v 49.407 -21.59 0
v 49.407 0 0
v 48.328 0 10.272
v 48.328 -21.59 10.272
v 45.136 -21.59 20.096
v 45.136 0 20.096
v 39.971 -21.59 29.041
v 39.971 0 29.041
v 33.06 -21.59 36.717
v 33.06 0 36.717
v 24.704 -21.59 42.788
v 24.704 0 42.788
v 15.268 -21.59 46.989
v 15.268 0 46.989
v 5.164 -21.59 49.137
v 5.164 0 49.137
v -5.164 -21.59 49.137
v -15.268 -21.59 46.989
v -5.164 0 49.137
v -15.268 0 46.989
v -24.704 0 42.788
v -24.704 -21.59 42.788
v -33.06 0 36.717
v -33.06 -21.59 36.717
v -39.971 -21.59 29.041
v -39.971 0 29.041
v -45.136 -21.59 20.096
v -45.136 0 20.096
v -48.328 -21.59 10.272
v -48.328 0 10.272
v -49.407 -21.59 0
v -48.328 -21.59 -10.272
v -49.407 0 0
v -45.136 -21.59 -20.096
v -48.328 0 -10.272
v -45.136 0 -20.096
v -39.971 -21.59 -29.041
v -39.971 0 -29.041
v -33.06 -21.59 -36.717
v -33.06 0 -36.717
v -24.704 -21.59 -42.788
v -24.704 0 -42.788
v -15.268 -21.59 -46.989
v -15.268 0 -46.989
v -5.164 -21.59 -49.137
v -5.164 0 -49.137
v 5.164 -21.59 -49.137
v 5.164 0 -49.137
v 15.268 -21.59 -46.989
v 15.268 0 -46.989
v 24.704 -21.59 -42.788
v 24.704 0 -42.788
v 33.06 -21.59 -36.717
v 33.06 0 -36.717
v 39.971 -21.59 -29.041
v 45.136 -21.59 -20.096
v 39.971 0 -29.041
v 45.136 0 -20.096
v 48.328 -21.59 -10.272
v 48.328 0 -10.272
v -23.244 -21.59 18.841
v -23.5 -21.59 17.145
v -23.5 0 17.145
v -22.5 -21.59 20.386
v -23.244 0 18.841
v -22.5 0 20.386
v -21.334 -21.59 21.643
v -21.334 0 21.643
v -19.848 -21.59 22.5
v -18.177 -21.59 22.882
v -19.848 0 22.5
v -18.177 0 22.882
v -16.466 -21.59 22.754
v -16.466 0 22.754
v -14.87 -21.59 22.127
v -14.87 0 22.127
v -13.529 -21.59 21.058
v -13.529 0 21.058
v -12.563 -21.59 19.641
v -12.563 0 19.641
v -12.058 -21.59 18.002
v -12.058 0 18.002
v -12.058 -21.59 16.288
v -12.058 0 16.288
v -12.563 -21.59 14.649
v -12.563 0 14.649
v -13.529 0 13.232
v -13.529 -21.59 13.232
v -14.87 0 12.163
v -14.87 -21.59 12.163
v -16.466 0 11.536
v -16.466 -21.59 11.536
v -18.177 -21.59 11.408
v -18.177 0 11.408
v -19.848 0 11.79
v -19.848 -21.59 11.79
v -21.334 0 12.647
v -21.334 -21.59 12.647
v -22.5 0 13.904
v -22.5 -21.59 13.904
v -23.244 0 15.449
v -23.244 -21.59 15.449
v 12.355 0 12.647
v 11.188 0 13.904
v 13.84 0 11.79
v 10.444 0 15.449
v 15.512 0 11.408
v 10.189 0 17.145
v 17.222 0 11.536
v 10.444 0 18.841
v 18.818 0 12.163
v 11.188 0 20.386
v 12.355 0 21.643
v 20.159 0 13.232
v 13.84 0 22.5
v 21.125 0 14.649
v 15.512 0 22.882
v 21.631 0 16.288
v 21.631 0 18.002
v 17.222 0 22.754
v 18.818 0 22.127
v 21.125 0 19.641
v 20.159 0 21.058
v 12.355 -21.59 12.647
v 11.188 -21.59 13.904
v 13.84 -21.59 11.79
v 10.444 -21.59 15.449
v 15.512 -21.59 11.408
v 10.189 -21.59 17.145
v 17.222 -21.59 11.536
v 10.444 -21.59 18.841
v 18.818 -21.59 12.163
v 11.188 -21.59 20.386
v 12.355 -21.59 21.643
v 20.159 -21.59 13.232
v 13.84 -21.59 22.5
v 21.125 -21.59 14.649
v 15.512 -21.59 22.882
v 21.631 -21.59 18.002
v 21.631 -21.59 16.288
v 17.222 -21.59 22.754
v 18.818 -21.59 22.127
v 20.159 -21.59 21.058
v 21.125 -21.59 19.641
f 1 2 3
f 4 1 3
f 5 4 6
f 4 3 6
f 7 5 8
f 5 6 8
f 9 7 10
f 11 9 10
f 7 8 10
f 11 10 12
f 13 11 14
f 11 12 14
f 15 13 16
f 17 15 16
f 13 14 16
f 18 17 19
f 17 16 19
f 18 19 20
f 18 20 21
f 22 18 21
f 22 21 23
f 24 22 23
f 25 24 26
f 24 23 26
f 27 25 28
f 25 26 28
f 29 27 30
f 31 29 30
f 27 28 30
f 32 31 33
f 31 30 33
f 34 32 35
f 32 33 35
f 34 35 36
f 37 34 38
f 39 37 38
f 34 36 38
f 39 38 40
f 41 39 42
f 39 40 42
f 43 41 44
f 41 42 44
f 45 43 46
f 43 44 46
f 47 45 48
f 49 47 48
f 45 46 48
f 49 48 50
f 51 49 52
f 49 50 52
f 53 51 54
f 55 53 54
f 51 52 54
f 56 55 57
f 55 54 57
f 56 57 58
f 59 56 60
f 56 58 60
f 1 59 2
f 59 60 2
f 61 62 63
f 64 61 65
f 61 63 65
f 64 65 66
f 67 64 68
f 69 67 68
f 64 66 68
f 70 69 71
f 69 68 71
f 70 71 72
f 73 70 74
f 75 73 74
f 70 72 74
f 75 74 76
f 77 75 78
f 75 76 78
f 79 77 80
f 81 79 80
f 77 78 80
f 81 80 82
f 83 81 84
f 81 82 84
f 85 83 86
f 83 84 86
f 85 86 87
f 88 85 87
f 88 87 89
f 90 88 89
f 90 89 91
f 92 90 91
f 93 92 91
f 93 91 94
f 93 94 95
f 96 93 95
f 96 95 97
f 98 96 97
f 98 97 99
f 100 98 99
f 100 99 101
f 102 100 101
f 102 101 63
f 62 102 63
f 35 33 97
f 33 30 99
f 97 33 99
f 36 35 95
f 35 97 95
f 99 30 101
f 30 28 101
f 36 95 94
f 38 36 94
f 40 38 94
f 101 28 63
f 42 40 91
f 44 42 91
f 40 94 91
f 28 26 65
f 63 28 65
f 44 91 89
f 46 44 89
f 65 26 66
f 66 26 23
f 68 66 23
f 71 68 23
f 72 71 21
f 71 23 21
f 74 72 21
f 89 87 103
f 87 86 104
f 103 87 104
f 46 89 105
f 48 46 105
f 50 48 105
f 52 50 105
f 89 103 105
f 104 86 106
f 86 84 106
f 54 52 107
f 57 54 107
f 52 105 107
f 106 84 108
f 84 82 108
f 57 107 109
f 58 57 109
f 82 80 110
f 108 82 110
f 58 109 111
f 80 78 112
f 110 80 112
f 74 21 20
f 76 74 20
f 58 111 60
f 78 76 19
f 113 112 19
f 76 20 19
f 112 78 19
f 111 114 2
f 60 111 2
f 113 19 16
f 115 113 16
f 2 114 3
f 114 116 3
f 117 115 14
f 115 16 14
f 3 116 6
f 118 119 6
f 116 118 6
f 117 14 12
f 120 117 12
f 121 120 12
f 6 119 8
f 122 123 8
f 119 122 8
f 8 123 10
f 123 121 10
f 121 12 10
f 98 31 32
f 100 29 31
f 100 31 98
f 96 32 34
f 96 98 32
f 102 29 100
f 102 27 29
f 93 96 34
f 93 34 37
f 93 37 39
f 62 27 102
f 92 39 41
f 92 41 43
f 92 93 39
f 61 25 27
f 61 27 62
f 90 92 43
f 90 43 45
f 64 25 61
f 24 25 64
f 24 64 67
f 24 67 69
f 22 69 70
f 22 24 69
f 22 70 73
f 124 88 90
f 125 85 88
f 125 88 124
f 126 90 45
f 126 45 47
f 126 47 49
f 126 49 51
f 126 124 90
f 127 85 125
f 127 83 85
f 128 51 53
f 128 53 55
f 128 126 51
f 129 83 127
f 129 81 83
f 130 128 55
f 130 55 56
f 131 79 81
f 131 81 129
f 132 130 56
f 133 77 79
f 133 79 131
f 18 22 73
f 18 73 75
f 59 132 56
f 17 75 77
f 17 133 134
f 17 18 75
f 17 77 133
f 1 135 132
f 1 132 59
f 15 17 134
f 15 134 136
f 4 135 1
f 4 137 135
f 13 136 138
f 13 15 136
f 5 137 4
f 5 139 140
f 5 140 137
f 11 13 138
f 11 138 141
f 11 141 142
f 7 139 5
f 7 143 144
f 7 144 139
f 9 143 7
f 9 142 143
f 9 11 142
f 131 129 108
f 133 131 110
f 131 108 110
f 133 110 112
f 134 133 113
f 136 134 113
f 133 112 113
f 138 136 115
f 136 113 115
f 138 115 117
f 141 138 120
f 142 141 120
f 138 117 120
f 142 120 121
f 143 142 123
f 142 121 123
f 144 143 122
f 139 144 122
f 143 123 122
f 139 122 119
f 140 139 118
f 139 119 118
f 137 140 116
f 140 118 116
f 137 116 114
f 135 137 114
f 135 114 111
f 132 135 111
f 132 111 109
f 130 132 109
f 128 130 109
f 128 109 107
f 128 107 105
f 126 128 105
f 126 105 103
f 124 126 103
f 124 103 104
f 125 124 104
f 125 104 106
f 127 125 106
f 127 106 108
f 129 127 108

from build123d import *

# Parameters (mm, degrees)
F0_R     = 49.4073615008
F1_DEPTH = 21.59
F3_D     = 11.5062
F6_D     = 11.5062


with BuildPart() as f1:
    # F0 (on Front) → F1 (new body)
    with BuildSketch(Plane.XZ):
        Circle(F0_R)
    extrude(amount=F1_DEPTH)

    # F3 (through all)
    with Locations(Plane.XZ.offset(21.59)):
        with Locations((-17.7465770394, 17.1450003982)):
            Hole(F3_D / 2)

    # F6 (through all)
    with Locations(Plane.XZ.offset(21.59)):
        with Locations((15.9418433905, 17.1450003982)):
            Hole(F6_D / 2)


solid = f1.part
